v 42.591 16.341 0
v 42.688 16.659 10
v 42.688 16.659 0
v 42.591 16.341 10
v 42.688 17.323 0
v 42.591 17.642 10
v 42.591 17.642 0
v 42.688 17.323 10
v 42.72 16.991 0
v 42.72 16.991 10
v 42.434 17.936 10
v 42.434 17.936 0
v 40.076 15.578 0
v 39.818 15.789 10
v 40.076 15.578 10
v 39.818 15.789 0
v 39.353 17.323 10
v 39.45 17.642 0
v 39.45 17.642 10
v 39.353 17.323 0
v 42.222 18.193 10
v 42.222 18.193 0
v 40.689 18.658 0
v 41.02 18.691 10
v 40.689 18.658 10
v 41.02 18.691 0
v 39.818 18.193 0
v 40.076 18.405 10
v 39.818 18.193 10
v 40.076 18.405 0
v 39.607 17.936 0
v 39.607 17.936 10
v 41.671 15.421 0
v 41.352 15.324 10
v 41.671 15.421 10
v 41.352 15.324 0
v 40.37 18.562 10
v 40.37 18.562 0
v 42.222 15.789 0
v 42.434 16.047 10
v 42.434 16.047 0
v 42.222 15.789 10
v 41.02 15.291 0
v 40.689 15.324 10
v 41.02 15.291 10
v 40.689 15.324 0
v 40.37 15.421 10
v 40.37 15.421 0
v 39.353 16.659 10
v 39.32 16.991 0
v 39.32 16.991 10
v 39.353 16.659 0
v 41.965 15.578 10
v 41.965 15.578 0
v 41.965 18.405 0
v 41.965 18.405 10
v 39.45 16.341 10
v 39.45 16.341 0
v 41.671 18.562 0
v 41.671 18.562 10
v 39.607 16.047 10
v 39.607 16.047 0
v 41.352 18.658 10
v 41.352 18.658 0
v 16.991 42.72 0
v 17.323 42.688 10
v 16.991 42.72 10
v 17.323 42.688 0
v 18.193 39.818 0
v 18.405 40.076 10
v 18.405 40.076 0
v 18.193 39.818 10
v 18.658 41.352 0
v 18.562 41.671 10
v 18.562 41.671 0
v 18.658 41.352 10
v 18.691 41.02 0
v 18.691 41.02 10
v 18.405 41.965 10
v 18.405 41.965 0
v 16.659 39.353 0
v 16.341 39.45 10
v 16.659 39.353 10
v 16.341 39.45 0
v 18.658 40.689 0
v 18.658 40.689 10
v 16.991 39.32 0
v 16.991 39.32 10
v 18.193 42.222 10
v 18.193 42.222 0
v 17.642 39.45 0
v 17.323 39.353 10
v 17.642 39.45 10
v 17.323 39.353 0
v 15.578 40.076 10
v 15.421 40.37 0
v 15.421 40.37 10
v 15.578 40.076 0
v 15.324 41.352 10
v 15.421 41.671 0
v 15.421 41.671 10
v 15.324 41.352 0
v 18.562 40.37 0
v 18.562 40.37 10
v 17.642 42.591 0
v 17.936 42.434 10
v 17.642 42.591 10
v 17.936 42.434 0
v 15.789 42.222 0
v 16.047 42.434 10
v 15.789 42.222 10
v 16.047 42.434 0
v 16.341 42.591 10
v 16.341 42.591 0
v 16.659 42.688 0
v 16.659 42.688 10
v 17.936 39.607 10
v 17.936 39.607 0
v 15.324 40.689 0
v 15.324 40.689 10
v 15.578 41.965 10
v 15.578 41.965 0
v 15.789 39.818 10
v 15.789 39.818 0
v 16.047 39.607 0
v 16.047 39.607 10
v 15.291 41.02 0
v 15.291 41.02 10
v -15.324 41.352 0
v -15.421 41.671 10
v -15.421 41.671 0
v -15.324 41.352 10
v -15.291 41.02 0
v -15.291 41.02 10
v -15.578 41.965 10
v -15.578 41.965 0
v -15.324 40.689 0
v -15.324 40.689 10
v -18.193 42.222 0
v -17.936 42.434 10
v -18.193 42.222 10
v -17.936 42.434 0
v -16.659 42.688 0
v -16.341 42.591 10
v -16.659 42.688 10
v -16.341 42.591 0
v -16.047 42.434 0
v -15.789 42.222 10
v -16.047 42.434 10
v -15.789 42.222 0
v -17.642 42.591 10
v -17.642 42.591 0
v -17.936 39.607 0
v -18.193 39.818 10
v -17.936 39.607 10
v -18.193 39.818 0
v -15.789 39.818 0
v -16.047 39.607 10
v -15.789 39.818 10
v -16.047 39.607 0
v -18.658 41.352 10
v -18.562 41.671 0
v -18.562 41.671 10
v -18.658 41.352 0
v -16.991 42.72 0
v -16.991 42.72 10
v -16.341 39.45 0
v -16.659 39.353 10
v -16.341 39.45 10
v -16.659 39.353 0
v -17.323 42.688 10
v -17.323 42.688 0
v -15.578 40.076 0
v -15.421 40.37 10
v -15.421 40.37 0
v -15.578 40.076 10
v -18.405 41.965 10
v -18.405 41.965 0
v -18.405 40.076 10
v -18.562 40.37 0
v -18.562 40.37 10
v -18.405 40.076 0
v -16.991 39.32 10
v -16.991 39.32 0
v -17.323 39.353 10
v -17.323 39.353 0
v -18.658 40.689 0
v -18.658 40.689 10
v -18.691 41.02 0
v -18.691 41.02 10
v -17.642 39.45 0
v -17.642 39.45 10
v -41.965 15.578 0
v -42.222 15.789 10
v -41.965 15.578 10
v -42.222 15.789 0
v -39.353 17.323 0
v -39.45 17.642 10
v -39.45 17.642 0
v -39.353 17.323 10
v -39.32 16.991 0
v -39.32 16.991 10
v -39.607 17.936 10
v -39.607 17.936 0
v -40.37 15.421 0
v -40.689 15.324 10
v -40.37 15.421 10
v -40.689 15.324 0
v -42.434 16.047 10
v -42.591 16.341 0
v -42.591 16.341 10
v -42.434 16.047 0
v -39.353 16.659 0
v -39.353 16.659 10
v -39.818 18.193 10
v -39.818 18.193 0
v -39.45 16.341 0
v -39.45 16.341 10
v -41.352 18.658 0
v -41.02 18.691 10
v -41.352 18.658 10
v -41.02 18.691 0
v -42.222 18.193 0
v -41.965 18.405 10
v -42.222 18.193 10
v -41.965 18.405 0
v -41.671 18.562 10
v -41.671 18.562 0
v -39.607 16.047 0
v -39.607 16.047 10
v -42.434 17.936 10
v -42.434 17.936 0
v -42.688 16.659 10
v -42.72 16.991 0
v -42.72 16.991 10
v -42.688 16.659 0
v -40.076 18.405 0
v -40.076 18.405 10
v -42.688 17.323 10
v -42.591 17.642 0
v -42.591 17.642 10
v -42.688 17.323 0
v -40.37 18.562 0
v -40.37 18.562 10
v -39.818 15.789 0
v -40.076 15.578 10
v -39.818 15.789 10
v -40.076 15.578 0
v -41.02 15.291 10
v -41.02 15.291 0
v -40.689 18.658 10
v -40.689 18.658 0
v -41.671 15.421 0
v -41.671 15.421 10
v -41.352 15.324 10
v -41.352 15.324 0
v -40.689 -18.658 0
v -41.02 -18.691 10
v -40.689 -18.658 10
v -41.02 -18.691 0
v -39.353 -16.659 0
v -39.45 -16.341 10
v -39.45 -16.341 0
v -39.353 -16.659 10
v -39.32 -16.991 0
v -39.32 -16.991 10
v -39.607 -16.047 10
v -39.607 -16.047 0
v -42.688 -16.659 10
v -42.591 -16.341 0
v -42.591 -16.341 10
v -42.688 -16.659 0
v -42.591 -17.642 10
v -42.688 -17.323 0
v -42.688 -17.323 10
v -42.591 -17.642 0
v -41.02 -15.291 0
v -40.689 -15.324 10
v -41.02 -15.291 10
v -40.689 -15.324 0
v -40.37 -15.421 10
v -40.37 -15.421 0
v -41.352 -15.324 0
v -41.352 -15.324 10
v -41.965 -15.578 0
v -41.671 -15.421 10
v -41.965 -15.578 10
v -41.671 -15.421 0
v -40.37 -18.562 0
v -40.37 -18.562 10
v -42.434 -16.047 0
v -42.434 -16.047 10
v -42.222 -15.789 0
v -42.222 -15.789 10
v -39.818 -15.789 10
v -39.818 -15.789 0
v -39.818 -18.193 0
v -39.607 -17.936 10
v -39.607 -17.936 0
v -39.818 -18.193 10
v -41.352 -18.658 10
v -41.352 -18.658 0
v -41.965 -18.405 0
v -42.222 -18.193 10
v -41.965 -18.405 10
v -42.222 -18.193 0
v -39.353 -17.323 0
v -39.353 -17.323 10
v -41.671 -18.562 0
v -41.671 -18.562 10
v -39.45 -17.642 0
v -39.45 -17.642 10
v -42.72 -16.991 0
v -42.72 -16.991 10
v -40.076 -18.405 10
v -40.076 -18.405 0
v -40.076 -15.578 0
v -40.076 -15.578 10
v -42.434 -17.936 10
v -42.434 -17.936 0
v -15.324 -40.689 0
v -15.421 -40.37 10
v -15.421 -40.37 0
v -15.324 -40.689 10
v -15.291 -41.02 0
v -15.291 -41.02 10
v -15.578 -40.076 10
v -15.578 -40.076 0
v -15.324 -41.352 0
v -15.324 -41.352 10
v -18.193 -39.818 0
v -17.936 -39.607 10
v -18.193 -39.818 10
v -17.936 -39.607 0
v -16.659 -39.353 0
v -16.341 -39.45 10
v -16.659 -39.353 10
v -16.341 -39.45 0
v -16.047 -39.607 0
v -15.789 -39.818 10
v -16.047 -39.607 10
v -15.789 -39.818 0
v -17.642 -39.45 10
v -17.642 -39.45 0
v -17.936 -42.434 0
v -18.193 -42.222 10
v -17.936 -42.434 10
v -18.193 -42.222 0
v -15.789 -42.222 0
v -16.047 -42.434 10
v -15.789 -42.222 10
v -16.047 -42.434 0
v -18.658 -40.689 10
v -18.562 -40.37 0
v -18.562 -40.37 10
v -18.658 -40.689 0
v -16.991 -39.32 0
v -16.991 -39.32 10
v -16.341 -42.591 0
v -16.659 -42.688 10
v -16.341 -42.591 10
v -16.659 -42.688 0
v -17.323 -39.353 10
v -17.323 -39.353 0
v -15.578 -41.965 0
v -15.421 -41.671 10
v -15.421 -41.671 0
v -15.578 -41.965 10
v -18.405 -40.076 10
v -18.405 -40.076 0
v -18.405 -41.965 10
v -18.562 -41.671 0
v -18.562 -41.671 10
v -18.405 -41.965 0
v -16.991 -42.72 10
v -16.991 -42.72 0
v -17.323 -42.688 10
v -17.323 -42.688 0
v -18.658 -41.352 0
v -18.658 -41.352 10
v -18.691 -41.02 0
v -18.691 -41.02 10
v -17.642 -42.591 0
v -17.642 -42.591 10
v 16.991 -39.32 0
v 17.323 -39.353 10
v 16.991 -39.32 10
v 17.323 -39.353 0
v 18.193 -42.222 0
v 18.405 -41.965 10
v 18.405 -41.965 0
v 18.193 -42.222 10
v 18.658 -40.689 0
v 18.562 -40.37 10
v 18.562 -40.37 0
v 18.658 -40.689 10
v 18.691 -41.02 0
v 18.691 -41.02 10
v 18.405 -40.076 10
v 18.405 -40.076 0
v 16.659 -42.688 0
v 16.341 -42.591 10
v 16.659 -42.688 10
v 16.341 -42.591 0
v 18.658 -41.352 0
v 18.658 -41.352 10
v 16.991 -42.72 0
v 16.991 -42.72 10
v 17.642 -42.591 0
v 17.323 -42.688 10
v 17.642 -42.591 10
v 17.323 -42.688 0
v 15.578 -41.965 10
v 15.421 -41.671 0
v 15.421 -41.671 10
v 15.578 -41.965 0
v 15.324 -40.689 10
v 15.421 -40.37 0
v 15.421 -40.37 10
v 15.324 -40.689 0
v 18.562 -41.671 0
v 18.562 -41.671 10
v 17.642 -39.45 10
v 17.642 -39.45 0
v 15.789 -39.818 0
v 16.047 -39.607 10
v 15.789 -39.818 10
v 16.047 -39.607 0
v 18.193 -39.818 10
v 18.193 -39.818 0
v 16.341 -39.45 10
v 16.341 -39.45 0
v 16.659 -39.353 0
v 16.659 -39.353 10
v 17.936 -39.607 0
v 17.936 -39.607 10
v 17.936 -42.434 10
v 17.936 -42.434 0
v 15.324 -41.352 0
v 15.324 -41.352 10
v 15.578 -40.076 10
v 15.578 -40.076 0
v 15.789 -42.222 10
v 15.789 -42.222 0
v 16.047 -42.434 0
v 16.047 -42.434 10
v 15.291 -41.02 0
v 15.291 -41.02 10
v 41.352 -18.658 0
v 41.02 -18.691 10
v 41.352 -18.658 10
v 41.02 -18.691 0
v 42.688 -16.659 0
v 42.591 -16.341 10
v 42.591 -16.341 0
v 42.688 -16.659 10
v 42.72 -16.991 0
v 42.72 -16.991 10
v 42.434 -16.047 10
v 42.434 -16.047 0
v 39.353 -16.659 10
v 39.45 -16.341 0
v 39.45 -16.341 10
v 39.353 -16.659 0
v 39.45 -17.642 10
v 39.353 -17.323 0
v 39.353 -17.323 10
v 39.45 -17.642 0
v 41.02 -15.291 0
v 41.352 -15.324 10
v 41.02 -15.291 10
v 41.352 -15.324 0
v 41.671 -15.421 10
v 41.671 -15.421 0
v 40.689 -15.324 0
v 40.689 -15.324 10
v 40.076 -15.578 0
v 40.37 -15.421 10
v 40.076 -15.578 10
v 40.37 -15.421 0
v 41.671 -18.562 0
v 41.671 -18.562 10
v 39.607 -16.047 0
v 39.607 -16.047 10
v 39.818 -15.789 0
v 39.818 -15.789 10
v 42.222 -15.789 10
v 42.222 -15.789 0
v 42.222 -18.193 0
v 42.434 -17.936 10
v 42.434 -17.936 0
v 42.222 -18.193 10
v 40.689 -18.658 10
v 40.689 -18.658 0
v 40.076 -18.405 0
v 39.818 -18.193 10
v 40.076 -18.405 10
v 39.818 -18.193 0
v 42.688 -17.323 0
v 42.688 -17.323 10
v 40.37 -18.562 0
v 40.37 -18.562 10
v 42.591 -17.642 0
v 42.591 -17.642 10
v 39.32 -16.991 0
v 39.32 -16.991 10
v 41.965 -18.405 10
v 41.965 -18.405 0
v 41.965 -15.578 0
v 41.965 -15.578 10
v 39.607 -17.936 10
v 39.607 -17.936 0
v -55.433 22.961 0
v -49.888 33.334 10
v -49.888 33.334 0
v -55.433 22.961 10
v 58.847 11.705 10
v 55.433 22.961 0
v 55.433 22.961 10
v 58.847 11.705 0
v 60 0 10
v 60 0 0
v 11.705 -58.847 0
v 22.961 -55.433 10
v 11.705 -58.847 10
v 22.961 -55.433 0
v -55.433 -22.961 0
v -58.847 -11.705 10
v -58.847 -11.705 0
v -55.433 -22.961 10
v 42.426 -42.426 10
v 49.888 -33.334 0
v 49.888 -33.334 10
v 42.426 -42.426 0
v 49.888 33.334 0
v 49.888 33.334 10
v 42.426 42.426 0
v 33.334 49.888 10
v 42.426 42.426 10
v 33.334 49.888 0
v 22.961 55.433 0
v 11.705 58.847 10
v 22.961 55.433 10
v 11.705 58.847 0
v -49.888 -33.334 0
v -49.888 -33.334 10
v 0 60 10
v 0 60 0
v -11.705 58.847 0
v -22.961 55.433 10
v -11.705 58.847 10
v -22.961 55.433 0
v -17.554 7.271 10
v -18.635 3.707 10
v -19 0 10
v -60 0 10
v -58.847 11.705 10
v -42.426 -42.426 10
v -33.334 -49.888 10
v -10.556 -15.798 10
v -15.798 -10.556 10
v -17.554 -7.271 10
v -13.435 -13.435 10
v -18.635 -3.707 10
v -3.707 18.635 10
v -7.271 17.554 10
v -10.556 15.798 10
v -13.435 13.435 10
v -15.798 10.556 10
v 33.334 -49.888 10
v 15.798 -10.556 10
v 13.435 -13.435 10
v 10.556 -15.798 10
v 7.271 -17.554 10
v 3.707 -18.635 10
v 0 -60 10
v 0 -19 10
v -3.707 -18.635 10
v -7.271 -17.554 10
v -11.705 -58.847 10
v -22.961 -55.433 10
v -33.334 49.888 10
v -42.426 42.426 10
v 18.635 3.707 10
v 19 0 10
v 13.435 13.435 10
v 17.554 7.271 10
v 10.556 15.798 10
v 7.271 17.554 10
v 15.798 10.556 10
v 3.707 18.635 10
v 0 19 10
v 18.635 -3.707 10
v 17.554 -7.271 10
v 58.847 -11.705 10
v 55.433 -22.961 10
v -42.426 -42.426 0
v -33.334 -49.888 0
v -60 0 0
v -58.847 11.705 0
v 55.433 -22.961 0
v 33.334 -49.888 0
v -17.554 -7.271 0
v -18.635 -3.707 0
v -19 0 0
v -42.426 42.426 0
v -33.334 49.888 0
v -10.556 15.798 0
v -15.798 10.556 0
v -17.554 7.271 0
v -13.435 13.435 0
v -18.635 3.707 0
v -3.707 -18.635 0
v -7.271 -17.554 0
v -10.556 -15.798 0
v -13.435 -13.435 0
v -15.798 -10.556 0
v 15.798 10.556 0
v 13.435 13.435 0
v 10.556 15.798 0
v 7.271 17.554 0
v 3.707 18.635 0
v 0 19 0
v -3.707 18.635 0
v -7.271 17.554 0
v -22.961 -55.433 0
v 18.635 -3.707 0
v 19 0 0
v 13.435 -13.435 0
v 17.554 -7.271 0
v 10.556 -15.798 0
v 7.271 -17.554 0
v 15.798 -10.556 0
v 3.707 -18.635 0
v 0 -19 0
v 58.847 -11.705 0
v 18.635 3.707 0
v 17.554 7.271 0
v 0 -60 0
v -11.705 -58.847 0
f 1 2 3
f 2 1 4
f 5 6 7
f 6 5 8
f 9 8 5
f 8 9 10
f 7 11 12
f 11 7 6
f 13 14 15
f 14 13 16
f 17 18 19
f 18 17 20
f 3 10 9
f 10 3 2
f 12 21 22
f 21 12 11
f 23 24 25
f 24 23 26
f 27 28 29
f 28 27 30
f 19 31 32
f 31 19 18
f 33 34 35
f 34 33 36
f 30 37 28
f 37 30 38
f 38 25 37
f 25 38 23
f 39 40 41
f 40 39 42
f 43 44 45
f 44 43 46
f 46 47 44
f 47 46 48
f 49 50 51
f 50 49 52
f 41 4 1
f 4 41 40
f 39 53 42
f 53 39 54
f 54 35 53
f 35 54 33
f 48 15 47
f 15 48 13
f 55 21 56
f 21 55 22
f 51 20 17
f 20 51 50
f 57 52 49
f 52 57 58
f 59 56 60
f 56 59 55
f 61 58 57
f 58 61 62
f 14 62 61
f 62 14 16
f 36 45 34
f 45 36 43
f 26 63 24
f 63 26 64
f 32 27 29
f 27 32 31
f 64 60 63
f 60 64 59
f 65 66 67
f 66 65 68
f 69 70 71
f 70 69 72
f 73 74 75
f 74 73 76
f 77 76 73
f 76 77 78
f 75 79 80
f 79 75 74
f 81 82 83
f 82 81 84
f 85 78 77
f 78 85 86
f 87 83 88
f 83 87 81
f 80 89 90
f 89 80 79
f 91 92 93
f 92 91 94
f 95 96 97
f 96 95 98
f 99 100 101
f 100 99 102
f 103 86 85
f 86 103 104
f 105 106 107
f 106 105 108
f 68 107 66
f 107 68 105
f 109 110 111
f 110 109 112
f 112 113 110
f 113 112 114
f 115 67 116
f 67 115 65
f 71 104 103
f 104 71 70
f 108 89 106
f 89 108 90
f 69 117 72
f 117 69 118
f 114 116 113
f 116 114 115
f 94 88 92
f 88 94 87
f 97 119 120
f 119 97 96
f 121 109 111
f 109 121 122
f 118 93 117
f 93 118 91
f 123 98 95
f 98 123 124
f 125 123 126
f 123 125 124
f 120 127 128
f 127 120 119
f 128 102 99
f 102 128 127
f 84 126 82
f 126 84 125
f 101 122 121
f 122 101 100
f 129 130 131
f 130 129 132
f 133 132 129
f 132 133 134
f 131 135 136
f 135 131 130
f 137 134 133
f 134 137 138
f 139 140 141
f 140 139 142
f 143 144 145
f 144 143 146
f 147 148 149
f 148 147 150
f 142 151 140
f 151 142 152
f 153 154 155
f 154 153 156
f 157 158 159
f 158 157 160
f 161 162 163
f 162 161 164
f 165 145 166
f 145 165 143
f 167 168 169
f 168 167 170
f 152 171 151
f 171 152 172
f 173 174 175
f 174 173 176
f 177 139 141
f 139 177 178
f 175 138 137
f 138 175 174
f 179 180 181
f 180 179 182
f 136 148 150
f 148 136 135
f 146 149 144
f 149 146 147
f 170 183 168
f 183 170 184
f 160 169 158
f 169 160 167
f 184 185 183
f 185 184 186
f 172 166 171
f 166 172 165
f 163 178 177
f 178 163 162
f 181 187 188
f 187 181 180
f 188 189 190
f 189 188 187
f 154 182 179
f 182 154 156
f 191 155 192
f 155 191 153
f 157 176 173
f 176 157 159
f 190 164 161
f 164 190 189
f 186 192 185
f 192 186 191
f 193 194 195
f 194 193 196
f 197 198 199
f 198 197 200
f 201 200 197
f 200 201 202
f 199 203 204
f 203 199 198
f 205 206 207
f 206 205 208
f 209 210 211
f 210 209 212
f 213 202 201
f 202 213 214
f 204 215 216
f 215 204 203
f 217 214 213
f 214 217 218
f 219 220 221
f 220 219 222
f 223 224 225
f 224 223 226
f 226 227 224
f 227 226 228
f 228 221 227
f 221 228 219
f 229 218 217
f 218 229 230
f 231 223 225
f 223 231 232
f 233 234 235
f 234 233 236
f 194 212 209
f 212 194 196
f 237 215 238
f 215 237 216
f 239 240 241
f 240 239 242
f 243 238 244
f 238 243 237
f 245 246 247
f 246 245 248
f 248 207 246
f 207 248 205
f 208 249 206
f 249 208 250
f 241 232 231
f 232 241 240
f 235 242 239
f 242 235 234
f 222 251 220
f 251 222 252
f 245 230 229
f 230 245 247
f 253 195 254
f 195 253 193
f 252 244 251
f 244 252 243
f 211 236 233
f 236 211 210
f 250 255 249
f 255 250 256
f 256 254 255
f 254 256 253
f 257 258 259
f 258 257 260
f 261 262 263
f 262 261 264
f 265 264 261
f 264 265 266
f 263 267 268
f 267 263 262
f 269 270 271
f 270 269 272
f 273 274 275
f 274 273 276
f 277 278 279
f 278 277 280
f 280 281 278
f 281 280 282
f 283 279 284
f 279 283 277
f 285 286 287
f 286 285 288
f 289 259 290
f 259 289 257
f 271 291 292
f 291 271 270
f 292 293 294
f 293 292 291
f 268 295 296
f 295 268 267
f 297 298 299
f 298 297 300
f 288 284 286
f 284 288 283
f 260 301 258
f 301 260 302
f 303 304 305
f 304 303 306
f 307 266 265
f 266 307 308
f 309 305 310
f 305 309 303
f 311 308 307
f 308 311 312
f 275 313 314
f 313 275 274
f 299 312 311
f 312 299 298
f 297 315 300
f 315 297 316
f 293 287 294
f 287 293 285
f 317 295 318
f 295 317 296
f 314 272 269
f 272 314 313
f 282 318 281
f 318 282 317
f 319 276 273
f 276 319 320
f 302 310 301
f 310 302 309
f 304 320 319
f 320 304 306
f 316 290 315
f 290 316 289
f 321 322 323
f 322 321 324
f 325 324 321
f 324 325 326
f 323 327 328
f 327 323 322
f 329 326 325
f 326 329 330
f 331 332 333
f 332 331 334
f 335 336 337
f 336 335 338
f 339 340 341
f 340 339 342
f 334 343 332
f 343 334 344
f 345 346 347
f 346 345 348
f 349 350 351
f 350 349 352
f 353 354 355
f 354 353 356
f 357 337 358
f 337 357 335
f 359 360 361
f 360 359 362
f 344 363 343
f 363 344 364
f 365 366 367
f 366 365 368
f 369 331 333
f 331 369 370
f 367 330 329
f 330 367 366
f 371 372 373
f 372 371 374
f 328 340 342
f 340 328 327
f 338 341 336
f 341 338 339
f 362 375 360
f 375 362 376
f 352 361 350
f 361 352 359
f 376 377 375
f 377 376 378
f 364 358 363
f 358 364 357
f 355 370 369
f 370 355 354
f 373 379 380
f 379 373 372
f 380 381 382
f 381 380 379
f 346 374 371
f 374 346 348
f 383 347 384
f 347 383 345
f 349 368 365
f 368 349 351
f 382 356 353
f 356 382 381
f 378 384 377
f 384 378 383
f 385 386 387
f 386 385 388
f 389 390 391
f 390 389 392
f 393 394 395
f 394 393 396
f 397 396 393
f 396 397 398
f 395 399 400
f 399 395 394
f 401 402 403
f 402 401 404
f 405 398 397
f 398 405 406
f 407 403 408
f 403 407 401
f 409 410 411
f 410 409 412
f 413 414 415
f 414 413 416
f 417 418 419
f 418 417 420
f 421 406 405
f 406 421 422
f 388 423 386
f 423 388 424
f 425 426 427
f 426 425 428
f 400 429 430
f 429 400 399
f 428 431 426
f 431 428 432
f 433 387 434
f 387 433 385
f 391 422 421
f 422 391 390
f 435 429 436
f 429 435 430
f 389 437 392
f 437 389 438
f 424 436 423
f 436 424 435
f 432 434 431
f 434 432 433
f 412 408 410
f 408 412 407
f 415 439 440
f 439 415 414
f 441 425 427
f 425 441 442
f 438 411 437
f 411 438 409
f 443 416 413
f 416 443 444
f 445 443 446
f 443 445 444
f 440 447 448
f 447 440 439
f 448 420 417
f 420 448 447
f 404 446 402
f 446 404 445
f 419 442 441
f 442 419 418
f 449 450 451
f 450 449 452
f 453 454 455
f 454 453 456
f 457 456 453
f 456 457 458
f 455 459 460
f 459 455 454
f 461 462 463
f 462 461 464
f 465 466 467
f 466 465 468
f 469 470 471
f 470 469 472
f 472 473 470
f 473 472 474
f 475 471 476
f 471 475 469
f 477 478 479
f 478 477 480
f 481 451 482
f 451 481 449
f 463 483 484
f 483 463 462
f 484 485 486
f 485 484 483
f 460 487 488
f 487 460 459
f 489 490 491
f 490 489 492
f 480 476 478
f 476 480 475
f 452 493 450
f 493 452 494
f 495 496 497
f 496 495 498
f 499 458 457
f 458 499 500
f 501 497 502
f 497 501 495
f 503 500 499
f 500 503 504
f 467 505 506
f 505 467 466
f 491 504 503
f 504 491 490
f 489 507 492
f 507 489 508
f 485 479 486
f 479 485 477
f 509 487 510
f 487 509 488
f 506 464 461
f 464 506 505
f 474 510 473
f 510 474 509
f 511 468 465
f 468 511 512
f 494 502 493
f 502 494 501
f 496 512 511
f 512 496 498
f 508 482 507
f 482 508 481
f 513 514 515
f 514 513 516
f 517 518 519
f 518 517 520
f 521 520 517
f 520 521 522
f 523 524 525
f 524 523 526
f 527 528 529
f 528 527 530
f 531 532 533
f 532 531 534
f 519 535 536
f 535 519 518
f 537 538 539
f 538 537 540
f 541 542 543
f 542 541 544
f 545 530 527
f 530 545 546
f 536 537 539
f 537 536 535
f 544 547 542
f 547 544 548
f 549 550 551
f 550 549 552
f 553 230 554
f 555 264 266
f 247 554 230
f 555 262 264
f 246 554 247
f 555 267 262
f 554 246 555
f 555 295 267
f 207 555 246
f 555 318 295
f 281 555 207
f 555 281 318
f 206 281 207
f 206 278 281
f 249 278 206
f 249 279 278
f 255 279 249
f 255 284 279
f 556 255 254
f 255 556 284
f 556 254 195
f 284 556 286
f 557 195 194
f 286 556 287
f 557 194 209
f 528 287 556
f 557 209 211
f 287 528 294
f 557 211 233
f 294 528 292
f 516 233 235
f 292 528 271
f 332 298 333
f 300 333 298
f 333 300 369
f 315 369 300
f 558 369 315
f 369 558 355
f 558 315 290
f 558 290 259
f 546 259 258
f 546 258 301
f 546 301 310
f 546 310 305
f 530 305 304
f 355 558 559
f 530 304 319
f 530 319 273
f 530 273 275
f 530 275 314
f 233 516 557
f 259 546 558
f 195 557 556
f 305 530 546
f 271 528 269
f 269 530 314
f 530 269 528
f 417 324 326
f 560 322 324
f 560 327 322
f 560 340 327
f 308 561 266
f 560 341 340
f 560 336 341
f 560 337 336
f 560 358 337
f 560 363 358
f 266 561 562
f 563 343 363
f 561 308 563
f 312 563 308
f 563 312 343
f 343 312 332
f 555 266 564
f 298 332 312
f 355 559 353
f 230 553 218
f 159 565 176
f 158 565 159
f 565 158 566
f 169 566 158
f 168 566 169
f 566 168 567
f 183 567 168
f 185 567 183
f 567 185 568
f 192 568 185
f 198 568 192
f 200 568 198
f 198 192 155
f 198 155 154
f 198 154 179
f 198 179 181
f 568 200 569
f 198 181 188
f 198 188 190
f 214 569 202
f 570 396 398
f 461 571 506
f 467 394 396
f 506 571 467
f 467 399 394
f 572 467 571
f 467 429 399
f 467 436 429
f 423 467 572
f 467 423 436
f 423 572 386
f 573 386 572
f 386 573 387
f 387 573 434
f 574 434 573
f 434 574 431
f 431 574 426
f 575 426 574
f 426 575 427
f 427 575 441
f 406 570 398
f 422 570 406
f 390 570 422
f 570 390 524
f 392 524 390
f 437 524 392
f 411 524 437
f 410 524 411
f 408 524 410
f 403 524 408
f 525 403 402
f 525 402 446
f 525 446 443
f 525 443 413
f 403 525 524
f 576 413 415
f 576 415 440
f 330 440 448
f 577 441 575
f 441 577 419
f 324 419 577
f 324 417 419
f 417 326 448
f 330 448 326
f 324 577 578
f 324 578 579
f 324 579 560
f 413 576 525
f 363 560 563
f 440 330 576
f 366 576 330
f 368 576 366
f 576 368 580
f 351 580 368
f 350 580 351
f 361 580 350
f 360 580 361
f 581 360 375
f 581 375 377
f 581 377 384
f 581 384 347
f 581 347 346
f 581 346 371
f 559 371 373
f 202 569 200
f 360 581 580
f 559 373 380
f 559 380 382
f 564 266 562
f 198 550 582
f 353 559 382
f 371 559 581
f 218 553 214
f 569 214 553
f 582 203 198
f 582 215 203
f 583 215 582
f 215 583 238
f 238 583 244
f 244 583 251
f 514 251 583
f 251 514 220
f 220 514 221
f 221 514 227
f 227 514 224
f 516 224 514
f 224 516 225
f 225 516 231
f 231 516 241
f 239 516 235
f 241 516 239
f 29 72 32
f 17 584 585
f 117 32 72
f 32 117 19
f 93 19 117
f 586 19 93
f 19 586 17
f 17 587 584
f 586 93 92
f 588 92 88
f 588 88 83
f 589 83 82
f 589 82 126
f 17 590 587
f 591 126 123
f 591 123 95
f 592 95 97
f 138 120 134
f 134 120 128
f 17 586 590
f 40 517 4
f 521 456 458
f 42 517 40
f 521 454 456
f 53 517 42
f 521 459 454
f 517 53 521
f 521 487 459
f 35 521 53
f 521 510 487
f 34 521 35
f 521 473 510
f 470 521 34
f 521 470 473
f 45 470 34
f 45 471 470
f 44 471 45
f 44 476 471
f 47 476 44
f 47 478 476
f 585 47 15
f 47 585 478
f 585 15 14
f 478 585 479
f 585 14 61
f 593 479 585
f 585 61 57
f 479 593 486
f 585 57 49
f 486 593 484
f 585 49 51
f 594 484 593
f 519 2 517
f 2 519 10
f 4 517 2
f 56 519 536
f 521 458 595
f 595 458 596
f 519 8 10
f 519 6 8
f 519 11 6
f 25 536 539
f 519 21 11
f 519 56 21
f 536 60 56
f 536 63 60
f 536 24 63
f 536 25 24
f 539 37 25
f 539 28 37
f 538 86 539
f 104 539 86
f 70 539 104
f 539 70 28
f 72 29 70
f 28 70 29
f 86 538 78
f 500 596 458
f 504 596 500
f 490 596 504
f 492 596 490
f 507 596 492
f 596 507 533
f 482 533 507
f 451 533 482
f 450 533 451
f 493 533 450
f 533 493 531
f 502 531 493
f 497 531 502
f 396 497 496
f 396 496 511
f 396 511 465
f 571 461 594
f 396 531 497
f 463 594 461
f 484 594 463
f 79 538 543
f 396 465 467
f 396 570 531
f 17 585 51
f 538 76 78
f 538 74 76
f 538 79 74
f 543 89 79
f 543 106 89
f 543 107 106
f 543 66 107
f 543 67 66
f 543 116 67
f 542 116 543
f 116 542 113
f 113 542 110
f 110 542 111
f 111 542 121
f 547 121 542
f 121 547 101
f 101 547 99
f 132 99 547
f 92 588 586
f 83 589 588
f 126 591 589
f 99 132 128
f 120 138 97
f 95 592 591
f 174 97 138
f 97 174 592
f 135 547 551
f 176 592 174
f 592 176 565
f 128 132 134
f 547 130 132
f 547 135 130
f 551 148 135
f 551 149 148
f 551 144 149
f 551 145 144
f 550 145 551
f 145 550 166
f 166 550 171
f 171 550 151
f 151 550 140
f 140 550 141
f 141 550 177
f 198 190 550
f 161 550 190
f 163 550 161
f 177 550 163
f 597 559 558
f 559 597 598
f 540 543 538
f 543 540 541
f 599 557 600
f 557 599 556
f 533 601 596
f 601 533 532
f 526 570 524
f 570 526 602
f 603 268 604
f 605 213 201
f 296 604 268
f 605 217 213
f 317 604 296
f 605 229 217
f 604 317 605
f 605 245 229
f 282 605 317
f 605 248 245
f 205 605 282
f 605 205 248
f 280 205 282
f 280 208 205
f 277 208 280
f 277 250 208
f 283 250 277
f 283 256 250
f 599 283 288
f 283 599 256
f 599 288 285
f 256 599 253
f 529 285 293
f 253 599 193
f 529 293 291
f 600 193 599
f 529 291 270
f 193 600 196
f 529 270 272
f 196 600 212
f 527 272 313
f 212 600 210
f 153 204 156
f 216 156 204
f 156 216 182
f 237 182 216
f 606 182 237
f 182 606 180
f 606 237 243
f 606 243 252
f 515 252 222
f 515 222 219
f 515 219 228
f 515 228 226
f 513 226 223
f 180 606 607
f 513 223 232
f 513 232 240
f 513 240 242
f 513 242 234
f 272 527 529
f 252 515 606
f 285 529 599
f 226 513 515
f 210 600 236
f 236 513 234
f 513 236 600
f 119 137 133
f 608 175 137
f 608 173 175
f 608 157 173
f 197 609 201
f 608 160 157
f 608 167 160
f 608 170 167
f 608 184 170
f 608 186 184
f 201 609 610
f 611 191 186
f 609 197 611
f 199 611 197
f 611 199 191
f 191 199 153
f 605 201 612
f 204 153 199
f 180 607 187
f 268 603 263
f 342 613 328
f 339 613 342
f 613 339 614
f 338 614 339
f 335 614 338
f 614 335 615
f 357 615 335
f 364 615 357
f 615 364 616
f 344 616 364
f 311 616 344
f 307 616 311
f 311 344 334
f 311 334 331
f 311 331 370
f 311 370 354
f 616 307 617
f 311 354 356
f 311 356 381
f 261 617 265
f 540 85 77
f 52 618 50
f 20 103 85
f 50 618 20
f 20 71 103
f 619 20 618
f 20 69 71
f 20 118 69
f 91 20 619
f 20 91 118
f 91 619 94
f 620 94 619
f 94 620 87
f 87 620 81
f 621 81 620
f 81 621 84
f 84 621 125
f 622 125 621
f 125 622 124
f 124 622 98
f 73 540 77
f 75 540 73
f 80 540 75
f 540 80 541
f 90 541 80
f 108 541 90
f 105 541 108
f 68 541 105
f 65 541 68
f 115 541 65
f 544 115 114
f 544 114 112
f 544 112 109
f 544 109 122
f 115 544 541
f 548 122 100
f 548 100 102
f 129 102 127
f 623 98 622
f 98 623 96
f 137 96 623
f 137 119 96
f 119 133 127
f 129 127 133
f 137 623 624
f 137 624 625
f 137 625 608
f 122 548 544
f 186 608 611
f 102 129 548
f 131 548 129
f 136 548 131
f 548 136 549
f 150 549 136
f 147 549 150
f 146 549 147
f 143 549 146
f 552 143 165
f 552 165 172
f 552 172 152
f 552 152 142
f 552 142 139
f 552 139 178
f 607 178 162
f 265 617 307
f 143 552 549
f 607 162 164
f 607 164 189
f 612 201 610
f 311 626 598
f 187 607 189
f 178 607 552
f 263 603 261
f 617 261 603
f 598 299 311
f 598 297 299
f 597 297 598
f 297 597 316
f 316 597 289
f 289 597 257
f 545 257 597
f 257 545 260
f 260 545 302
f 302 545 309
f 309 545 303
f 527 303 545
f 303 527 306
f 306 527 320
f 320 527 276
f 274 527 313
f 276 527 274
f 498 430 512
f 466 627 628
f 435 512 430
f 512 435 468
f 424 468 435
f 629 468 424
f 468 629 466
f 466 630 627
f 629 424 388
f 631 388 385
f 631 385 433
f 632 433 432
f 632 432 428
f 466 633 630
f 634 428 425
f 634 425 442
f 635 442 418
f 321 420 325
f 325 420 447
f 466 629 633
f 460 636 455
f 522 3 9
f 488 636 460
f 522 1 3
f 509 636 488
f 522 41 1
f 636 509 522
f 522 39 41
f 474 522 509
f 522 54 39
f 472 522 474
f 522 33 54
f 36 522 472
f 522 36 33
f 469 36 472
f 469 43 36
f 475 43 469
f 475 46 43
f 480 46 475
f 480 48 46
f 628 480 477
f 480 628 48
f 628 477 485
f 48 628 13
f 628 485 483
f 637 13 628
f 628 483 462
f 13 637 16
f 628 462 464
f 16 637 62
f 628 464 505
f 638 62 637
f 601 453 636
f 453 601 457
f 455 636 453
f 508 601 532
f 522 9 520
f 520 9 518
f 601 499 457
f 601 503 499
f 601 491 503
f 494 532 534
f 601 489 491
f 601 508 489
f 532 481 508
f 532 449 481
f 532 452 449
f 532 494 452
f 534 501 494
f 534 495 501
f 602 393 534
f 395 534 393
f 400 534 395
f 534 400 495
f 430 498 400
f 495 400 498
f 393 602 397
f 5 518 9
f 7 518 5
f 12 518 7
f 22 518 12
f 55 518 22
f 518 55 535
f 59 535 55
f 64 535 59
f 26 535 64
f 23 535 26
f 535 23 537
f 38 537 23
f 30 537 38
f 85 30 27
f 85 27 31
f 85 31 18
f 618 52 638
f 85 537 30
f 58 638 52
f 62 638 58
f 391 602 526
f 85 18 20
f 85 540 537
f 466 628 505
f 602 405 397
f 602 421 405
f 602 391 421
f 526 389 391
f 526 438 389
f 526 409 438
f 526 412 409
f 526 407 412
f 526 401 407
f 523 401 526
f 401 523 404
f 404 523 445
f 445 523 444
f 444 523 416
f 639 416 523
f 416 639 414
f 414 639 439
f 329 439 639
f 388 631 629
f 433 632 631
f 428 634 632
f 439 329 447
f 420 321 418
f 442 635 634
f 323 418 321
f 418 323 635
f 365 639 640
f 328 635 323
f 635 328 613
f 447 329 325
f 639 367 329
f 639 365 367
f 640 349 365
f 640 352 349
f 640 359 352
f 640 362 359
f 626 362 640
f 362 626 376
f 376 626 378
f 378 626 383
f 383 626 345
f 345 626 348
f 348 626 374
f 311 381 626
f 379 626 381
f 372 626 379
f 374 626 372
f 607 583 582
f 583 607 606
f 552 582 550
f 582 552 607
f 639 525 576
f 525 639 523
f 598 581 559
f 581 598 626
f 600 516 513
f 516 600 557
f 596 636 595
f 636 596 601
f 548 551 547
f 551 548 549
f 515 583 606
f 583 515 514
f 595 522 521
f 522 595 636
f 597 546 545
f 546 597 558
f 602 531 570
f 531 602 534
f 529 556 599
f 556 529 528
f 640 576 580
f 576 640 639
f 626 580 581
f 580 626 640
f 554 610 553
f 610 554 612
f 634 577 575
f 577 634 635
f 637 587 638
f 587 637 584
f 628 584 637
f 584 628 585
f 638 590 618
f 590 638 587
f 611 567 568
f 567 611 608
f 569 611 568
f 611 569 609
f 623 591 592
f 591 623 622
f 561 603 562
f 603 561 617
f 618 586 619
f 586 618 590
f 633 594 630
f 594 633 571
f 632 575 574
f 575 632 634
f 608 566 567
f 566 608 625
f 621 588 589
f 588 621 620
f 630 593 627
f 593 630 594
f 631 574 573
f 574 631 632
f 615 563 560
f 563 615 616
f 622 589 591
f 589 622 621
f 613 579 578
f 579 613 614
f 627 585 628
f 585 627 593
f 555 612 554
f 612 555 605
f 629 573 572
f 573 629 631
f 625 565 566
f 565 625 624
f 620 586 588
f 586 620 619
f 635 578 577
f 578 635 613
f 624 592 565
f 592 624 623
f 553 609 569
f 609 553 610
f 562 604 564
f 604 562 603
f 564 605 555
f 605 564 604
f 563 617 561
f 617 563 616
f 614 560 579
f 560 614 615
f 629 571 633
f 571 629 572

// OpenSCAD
$fn = 32;

// ----------------------------------------------------------------------
// Flange Ø120 x 10
// 8 holes on a Ø88.8 bolt circle, bolted joints
// ----------------------------------------------------------------------

// --- parameters (mm) ---
flange_d = 120;    // outside diameter of the flange
thickness = 10;    // flange thickness
holes = 8;         // number of bolt holes
pcd = 88.8;        // bolt circle diameter
start_deg = 22.5;  // angle of the first hole, from +X
hole_d = 3.4;      // bolt hole diameter
bore_d = 38;       // central through bore
hub_d = 46;        // hub outside diameter
hub_h = 0;         // hub height above the flange face (0 = no hub)

// --- derived feature positions (mm) ---
height = thickness + hub_h;  // = 10   overall height of the part
pcd_r = pcd / 2;             // = 44.4   bolt circle radius
hole_step = 360 / holes;     // = 45   angular pitch
feature_centers = [
  [pcd_r * cos(start_deg + 0 * hole_step), pcd_r * sin(start_deg + 0 * hole_step)],
  [pcd_r * cos(start_deg + 1 * hole_step), pcd_r * sin(start_deg + 1 * hole_step)],
  [pcd_r * cos(start_deg + 2 * hole_step), pcd_r * sin(start_deg + 2 * hole_step)],
  [pcd_r * cos(start_deg + 3 * hole_step), pcd_r * sin(start_deg + 3 * hole_step)],
  [pcd_r * cos(start_deg + 4 * hole_step), pcd_r * sin(start_deg + 4 * hole_step)],
  [pcd_r * cos(start_deg + 5 * hole_step), pcd_r * sin(start_deg + 5 * hole_step)],
  [pcd_r * cos(start_deg + 6 * hole_step), pcd_r * sin(start_deg + 6 * hole_step)],
  [pcd_r * cos(start_deg + 7 * hole_step), pcd_r * sin(start_deg + 7 * hole_step)]
];   // bolt hole centres on the pitch circle

// flange disc, every hole and the bore cut straight through
difference() {
  union() {
    cylinder(d = flange_d, h = thickness);
  }
  translate([0, 0, -1]) cylinder(d = bore_d, h = height + 2);  // bore, through
  for (centre = feature_centers)
    translate([centre[0], centre[1], -1]) cylinder(d = hole_d, h = thickness + 2);
}
